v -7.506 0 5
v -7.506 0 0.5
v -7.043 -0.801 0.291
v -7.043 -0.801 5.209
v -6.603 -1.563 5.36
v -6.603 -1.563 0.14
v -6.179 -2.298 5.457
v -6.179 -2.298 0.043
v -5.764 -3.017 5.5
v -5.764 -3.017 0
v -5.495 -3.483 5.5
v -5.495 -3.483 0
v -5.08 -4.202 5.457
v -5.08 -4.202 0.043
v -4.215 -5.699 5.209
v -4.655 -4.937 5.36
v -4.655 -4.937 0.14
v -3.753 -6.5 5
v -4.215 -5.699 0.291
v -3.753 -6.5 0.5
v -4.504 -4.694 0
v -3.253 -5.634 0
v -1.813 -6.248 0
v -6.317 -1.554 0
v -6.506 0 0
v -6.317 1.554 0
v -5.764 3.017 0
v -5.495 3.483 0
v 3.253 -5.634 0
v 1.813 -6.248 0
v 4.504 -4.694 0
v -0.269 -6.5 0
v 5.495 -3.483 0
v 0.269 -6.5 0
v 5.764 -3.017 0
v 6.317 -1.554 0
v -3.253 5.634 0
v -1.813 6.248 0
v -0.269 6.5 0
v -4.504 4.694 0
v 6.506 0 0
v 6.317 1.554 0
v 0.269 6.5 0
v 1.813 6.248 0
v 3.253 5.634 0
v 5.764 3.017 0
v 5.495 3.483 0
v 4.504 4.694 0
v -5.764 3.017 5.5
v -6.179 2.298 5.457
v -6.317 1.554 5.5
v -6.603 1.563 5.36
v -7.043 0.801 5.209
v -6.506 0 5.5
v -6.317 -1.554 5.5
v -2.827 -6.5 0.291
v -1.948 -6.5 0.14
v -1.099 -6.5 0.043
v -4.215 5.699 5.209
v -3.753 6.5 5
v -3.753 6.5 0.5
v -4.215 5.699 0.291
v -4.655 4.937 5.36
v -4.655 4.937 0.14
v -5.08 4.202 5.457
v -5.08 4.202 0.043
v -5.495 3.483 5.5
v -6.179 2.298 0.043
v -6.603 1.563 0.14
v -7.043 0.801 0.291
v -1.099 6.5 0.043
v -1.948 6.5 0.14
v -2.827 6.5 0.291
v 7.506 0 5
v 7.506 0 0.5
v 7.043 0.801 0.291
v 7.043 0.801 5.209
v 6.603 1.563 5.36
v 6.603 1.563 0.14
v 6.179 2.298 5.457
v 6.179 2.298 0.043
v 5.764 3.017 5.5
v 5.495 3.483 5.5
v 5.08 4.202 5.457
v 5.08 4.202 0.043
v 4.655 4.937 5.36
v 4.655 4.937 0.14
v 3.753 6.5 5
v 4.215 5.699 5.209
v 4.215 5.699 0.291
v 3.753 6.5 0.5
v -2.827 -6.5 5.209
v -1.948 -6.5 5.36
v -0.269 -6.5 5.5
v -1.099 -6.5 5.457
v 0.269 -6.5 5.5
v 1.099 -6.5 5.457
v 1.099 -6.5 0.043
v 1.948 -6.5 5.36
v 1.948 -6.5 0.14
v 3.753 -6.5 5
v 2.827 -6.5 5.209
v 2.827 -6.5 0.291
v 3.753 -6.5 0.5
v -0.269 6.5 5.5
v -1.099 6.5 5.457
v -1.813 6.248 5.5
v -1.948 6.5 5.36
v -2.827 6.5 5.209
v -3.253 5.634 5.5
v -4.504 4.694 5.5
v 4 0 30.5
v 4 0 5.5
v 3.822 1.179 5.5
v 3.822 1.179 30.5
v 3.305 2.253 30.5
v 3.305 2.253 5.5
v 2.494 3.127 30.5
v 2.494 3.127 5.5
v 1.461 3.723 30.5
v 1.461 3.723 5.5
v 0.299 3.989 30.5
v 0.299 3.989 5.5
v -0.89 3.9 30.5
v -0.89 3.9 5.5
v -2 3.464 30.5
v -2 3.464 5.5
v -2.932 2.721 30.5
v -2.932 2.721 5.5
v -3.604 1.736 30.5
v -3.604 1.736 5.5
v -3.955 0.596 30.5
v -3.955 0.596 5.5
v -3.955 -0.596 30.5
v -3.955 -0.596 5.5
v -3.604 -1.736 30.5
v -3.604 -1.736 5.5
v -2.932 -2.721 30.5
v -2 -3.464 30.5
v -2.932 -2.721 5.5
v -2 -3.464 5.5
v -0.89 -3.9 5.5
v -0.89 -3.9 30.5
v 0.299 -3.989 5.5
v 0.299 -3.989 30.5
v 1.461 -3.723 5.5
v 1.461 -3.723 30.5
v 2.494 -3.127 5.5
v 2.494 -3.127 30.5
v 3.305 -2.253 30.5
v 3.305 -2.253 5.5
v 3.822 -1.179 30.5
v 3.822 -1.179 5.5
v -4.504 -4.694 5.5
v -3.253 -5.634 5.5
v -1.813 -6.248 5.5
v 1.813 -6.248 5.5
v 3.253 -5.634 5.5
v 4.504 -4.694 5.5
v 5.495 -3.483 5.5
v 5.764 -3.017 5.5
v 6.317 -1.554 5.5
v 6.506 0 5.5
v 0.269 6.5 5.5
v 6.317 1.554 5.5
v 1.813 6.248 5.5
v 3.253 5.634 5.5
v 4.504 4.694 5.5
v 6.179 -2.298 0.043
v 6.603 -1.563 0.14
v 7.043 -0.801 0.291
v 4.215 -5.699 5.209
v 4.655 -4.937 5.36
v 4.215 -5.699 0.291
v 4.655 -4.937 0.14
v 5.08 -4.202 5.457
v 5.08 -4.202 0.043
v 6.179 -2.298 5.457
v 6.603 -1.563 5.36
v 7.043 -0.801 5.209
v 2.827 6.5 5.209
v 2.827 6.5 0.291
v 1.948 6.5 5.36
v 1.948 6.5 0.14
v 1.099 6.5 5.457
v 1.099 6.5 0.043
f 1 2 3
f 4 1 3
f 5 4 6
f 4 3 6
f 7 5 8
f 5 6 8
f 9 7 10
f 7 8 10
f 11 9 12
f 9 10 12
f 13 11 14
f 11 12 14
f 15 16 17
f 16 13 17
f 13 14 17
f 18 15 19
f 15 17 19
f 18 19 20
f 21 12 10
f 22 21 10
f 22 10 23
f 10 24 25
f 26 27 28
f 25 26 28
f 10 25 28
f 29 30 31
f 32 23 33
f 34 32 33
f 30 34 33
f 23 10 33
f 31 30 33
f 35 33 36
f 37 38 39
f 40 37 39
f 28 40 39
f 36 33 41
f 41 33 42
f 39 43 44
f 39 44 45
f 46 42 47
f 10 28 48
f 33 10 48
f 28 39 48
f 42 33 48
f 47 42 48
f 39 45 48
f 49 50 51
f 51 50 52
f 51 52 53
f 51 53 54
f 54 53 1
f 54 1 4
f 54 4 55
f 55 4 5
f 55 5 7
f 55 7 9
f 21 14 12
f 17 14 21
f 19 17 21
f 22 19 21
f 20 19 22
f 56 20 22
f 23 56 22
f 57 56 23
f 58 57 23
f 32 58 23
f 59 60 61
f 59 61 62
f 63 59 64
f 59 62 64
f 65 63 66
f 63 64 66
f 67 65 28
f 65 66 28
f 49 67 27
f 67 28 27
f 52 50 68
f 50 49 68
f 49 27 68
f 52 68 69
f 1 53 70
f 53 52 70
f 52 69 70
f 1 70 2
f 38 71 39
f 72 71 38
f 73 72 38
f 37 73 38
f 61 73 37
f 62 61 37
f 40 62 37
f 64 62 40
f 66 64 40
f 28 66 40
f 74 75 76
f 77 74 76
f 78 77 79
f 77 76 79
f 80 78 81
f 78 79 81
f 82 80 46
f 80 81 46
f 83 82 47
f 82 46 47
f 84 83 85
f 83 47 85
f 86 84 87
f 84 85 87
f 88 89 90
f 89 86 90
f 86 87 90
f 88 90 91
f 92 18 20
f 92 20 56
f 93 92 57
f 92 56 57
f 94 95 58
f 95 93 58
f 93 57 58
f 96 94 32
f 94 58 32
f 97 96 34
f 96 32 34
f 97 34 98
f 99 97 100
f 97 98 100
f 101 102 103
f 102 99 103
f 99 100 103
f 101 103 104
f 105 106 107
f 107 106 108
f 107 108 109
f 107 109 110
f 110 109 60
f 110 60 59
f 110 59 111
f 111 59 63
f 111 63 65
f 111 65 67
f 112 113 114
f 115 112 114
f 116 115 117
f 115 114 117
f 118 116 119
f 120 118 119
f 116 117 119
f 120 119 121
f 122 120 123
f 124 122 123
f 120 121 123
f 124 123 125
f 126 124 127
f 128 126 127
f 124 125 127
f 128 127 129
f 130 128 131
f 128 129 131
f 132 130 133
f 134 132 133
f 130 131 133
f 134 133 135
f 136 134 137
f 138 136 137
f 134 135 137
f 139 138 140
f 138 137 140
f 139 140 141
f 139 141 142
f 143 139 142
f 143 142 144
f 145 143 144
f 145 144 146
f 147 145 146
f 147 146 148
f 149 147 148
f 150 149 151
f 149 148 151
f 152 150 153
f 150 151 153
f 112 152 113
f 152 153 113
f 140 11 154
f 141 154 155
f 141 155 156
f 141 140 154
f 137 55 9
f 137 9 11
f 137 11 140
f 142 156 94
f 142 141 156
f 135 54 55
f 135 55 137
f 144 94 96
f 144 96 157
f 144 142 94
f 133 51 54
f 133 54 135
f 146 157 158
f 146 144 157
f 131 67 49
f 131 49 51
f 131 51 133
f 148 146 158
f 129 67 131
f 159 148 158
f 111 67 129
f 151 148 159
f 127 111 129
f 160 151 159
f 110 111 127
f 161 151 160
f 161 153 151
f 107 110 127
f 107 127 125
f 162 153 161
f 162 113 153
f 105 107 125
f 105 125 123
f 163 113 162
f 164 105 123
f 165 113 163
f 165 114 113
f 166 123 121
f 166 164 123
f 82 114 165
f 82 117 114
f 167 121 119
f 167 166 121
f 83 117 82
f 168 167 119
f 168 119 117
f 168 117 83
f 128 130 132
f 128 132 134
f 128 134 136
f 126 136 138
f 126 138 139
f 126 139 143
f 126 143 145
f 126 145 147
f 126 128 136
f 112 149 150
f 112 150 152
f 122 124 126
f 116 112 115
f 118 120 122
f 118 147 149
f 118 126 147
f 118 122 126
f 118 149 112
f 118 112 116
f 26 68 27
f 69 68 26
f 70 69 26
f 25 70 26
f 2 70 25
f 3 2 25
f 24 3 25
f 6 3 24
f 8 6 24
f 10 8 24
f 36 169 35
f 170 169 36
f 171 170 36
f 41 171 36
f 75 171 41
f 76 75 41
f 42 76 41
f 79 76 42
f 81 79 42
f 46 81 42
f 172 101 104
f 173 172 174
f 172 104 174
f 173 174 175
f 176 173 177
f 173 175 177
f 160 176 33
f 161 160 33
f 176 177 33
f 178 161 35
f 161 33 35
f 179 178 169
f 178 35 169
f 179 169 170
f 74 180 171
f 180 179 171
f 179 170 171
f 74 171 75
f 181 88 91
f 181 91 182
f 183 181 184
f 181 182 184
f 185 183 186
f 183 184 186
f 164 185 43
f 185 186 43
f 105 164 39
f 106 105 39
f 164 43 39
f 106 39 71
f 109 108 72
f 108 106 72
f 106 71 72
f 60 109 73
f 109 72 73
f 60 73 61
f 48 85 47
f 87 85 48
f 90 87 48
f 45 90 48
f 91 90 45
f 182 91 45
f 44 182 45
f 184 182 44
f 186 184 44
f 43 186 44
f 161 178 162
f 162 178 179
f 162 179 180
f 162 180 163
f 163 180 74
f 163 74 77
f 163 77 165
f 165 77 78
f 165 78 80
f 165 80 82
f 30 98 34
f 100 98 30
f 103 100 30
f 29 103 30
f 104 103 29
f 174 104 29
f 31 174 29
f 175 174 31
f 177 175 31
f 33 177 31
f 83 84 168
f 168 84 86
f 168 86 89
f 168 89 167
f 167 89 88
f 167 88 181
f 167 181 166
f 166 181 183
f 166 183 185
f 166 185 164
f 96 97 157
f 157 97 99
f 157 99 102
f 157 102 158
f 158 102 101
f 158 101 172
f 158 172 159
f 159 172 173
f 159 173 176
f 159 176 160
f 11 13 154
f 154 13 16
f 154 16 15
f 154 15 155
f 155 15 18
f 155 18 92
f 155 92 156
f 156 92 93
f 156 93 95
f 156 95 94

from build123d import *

# Parameters (mm, degrees)
PAD008_DEPTH = 5.5
SKETCH029_R  = 4
PAD009_DEPTH = 25


with BuildPart() as part:
    # Sketch028 → Pad008 (new body)
    with BuildSketch(Plane.XY):
        Polygon((7.5055534995, 0), (3.7527767497, 6.5), (-3.7527767497, 6.5), (-7.5055534995, 0), (-3.7527767497, -6.5), (3.7527767497, -6.5), align=None)
    extrude(amount=PAD008_DEPTH)

    # Sketch029 (on Face8 of Pad008) → Pad009 (join)
    with BuildSketch(Plane.XY.offset(5.5)):
        Circle(SKETCH029_R)
    extrude(amount=PAD009_DEPTH)

    # Sketch030 → Groove001 (revolve, cut)
    with BuildSketch(Plane.XZ):
        Polygon((4, 30.5), (3.5, 30.5), (4, 31), align=None)
        Polygon((7.5055534995, 5.5), (6.5055534995, 5.5), (7.5055534995, 5), align=None)
        Polygon((7.5055534995, 0), (6.5055534995, 0), (7.5055534995, 0.5), align=None)
    revolve(axis=Axis((0, 0, 0), (0, 0, 1)), mode=Mode.SUBTRACT)


solid = part.part
